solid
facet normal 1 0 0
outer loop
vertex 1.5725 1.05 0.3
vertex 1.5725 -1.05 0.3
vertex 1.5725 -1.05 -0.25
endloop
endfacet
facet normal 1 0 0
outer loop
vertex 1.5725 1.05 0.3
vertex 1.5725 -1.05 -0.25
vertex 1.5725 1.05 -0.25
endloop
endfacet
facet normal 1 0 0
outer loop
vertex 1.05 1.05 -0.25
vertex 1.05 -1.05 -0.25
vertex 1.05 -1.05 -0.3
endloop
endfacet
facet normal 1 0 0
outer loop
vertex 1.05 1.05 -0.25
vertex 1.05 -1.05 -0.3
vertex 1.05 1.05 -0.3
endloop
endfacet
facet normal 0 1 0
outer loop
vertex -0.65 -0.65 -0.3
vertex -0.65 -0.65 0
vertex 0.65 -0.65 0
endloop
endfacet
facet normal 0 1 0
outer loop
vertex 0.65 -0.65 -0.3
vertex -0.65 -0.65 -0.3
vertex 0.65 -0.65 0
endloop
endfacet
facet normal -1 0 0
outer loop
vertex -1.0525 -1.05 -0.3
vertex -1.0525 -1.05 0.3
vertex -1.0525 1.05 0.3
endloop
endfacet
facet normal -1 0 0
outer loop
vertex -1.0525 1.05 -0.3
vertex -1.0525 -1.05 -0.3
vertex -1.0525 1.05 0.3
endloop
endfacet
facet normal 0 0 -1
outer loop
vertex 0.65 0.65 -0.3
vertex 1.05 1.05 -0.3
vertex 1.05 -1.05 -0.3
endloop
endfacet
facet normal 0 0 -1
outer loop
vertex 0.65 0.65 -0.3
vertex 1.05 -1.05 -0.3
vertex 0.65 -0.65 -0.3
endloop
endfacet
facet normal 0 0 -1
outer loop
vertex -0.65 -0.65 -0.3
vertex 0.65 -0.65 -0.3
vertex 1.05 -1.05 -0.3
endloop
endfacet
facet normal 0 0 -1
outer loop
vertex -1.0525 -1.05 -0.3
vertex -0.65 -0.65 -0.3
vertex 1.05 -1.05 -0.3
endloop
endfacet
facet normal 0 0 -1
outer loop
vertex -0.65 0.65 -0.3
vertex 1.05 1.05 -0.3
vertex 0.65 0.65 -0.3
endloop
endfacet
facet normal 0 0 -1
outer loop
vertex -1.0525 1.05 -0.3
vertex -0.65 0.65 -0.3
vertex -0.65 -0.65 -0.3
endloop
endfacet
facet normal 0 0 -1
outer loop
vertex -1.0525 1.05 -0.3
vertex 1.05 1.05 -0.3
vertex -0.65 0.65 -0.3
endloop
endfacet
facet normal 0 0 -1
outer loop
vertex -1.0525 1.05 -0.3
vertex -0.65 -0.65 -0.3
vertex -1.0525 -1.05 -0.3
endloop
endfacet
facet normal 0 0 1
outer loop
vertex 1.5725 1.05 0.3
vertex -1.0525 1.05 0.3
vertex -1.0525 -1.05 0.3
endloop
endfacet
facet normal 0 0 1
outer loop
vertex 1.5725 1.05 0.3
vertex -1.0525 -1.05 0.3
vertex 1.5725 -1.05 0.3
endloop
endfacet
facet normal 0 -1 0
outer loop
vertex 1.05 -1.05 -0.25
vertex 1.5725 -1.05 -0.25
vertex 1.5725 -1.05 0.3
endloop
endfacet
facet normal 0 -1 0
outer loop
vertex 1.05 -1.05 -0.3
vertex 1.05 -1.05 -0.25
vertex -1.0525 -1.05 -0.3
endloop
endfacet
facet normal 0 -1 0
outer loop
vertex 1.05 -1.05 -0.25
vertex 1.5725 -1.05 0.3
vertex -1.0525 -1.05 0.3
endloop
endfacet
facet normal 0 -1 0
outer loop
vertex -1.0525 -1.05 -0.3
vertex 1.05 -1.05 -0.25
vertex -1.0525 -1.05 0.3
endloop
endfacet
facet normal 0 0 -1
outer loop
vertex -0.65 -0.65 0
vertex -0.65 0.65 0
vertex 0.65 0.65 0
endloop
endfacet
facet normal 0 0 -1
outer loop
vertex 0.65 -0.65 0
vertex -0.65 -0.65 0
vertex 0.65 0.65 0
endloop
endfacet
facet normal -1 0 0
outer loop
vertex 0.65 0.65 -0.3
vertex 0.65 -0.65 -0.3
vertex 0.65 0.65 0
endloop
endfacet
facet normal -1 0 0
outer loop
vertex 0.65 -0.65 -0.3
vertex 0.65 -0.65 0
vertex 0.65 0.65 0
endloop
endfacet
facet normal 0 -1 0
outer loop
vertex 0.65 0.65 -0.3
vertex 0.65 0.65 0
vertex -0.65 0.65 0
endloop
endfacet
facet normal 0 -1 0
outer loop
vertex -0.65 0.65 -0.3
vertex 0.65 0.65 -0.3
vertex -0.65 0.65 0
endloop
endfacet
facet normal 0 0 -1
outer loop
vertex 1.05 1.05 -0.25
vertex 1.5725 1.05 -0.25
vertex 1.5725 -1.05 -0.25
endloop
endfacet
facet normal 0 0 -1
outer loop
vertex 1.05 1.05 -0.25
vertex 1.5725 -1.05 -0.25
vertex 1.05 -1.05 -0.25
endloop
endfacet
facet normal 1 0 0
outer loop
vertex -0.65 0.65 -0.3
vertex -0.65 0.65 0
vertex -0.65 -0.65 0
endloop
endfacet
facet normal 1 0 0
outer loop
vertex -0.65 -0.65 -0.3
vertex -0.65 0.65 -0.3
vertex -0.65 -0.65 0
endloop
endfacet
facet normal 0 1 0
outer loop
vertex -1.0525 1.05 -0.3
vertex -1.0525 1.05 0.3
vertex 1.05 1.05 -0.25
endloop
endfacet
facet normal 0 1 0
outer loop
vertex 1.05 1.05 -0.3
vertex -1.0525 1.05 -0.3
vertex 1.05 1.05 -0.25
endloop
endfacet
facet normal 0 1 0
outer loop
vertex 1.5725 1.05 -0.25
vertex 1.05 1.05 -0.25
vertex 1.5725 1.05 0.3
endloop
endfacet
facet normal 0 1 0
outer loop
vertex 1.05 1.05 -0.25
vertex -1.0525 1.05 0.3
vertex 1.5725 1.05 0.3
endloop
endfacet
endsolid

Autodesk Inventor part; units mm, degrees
ref_plane "YZ Plane" through (0, 0, 0) normal (1, 0, 0) x (0, 1, 0)
sketch "Sketch1" plane through (0, 0, 0) normal (0, 0, 1) x (1, 0, 0)
  line L0 (1.5725, 1.05) -> (1.05, 1.05) projected
  line L1 (1.05, 1.05) -> (1.05, -1.05) projected
  line L2 (1.05, -1.05) -> (1.5725, -1.05) projected
  line L3 (1.5725, -1.05) -> (1.5725, 1.05) projected
  line L4 (1.05, -1.05) -> (1.05, 1.05) projected
  line L5 (-1.0525, 1.05) -> (1.05, 1.05) projected
  line L6 (-1.0525, -1.05) -> (-1.0525, 1.05) projected
  line L7 (1.05, -1.05) -> (-1.0525, -1.05) projected
  line L8 (-0.65, -0.65) -> (0.65, -0.65) projected
  line L9 (-0.65, 0.65) -> (-0.65, -0.65) projected
  line L10 (0.65, 0.65) -> (-0.65, 0.65) projected
  line L11 (0.65, -0.65) -> (0.65, 0.65) projected
  point P0 (0, 0)
extrude "Extrusion1" add sketch "Sketch1" along normal blind 0.3 contours L3 L2 L1 L0 | L1 L7 L6 L5 | L9 L10 L11 L8
sketch "Sketch2" plane through (0, 0, 0) normal (0, 0, -1) x (-1, 0, 0)
  line L0 (-1.5725, 1.05) -> (-1.05, 1.05)
  line L1 (-1.05, 1.05) -> (-1.05, -1.05)
  line L2 (-1.05, -1.05) -> (-1.5725, -1.05)
  line L3 (-1.5725, -1.05) -> (-1.5725, 1.05)
  point P0 (0, 0)
ref_plane "Work Plane1" through (1.05, -1.05, -0.25) normal (0, 0, 1) x (1, 0, 0)
extrude "Extrusion2" add sketch "Sketch2" along normal up to surface (0.25 mm away)
sketch "Sketch3" plane through (0, 0, 0) normal (0, 0, -1) x (-1, 0, 0)
  line L0 (-1.05, -1.05) -> (-1.05, 1.05)
  line L1 (1.0525, 1.05) -> (-1.05, 1.05)
  line L2 (1.0525, -1.05) -> (1.0525, 1.05)
  line L3 (-1.05, -1.05) -> (1.0525, -1.05)
  line L4 (0.65, -0.65) -> (-0.65, -0.65)
  line L5 (0.65, 0.65) -> (0.65, -0.65)
  line L6 (-0.65, 0.65) -> (0.65, 0.65)
  line L7 (-0.65, -0.65) -> (-0.65, 0.65)
  point P0 (0, 0)
ref_plane "Work Plane2" through (-1.0525, -1.05, -0.3) normal (0, 0, 1) x (1, 0, 0)
extrude "Extrusion3" add sketch "Sketch3" along normal up to surface (0.3 mm away)
properties part number "epoxy" material "Glass"
